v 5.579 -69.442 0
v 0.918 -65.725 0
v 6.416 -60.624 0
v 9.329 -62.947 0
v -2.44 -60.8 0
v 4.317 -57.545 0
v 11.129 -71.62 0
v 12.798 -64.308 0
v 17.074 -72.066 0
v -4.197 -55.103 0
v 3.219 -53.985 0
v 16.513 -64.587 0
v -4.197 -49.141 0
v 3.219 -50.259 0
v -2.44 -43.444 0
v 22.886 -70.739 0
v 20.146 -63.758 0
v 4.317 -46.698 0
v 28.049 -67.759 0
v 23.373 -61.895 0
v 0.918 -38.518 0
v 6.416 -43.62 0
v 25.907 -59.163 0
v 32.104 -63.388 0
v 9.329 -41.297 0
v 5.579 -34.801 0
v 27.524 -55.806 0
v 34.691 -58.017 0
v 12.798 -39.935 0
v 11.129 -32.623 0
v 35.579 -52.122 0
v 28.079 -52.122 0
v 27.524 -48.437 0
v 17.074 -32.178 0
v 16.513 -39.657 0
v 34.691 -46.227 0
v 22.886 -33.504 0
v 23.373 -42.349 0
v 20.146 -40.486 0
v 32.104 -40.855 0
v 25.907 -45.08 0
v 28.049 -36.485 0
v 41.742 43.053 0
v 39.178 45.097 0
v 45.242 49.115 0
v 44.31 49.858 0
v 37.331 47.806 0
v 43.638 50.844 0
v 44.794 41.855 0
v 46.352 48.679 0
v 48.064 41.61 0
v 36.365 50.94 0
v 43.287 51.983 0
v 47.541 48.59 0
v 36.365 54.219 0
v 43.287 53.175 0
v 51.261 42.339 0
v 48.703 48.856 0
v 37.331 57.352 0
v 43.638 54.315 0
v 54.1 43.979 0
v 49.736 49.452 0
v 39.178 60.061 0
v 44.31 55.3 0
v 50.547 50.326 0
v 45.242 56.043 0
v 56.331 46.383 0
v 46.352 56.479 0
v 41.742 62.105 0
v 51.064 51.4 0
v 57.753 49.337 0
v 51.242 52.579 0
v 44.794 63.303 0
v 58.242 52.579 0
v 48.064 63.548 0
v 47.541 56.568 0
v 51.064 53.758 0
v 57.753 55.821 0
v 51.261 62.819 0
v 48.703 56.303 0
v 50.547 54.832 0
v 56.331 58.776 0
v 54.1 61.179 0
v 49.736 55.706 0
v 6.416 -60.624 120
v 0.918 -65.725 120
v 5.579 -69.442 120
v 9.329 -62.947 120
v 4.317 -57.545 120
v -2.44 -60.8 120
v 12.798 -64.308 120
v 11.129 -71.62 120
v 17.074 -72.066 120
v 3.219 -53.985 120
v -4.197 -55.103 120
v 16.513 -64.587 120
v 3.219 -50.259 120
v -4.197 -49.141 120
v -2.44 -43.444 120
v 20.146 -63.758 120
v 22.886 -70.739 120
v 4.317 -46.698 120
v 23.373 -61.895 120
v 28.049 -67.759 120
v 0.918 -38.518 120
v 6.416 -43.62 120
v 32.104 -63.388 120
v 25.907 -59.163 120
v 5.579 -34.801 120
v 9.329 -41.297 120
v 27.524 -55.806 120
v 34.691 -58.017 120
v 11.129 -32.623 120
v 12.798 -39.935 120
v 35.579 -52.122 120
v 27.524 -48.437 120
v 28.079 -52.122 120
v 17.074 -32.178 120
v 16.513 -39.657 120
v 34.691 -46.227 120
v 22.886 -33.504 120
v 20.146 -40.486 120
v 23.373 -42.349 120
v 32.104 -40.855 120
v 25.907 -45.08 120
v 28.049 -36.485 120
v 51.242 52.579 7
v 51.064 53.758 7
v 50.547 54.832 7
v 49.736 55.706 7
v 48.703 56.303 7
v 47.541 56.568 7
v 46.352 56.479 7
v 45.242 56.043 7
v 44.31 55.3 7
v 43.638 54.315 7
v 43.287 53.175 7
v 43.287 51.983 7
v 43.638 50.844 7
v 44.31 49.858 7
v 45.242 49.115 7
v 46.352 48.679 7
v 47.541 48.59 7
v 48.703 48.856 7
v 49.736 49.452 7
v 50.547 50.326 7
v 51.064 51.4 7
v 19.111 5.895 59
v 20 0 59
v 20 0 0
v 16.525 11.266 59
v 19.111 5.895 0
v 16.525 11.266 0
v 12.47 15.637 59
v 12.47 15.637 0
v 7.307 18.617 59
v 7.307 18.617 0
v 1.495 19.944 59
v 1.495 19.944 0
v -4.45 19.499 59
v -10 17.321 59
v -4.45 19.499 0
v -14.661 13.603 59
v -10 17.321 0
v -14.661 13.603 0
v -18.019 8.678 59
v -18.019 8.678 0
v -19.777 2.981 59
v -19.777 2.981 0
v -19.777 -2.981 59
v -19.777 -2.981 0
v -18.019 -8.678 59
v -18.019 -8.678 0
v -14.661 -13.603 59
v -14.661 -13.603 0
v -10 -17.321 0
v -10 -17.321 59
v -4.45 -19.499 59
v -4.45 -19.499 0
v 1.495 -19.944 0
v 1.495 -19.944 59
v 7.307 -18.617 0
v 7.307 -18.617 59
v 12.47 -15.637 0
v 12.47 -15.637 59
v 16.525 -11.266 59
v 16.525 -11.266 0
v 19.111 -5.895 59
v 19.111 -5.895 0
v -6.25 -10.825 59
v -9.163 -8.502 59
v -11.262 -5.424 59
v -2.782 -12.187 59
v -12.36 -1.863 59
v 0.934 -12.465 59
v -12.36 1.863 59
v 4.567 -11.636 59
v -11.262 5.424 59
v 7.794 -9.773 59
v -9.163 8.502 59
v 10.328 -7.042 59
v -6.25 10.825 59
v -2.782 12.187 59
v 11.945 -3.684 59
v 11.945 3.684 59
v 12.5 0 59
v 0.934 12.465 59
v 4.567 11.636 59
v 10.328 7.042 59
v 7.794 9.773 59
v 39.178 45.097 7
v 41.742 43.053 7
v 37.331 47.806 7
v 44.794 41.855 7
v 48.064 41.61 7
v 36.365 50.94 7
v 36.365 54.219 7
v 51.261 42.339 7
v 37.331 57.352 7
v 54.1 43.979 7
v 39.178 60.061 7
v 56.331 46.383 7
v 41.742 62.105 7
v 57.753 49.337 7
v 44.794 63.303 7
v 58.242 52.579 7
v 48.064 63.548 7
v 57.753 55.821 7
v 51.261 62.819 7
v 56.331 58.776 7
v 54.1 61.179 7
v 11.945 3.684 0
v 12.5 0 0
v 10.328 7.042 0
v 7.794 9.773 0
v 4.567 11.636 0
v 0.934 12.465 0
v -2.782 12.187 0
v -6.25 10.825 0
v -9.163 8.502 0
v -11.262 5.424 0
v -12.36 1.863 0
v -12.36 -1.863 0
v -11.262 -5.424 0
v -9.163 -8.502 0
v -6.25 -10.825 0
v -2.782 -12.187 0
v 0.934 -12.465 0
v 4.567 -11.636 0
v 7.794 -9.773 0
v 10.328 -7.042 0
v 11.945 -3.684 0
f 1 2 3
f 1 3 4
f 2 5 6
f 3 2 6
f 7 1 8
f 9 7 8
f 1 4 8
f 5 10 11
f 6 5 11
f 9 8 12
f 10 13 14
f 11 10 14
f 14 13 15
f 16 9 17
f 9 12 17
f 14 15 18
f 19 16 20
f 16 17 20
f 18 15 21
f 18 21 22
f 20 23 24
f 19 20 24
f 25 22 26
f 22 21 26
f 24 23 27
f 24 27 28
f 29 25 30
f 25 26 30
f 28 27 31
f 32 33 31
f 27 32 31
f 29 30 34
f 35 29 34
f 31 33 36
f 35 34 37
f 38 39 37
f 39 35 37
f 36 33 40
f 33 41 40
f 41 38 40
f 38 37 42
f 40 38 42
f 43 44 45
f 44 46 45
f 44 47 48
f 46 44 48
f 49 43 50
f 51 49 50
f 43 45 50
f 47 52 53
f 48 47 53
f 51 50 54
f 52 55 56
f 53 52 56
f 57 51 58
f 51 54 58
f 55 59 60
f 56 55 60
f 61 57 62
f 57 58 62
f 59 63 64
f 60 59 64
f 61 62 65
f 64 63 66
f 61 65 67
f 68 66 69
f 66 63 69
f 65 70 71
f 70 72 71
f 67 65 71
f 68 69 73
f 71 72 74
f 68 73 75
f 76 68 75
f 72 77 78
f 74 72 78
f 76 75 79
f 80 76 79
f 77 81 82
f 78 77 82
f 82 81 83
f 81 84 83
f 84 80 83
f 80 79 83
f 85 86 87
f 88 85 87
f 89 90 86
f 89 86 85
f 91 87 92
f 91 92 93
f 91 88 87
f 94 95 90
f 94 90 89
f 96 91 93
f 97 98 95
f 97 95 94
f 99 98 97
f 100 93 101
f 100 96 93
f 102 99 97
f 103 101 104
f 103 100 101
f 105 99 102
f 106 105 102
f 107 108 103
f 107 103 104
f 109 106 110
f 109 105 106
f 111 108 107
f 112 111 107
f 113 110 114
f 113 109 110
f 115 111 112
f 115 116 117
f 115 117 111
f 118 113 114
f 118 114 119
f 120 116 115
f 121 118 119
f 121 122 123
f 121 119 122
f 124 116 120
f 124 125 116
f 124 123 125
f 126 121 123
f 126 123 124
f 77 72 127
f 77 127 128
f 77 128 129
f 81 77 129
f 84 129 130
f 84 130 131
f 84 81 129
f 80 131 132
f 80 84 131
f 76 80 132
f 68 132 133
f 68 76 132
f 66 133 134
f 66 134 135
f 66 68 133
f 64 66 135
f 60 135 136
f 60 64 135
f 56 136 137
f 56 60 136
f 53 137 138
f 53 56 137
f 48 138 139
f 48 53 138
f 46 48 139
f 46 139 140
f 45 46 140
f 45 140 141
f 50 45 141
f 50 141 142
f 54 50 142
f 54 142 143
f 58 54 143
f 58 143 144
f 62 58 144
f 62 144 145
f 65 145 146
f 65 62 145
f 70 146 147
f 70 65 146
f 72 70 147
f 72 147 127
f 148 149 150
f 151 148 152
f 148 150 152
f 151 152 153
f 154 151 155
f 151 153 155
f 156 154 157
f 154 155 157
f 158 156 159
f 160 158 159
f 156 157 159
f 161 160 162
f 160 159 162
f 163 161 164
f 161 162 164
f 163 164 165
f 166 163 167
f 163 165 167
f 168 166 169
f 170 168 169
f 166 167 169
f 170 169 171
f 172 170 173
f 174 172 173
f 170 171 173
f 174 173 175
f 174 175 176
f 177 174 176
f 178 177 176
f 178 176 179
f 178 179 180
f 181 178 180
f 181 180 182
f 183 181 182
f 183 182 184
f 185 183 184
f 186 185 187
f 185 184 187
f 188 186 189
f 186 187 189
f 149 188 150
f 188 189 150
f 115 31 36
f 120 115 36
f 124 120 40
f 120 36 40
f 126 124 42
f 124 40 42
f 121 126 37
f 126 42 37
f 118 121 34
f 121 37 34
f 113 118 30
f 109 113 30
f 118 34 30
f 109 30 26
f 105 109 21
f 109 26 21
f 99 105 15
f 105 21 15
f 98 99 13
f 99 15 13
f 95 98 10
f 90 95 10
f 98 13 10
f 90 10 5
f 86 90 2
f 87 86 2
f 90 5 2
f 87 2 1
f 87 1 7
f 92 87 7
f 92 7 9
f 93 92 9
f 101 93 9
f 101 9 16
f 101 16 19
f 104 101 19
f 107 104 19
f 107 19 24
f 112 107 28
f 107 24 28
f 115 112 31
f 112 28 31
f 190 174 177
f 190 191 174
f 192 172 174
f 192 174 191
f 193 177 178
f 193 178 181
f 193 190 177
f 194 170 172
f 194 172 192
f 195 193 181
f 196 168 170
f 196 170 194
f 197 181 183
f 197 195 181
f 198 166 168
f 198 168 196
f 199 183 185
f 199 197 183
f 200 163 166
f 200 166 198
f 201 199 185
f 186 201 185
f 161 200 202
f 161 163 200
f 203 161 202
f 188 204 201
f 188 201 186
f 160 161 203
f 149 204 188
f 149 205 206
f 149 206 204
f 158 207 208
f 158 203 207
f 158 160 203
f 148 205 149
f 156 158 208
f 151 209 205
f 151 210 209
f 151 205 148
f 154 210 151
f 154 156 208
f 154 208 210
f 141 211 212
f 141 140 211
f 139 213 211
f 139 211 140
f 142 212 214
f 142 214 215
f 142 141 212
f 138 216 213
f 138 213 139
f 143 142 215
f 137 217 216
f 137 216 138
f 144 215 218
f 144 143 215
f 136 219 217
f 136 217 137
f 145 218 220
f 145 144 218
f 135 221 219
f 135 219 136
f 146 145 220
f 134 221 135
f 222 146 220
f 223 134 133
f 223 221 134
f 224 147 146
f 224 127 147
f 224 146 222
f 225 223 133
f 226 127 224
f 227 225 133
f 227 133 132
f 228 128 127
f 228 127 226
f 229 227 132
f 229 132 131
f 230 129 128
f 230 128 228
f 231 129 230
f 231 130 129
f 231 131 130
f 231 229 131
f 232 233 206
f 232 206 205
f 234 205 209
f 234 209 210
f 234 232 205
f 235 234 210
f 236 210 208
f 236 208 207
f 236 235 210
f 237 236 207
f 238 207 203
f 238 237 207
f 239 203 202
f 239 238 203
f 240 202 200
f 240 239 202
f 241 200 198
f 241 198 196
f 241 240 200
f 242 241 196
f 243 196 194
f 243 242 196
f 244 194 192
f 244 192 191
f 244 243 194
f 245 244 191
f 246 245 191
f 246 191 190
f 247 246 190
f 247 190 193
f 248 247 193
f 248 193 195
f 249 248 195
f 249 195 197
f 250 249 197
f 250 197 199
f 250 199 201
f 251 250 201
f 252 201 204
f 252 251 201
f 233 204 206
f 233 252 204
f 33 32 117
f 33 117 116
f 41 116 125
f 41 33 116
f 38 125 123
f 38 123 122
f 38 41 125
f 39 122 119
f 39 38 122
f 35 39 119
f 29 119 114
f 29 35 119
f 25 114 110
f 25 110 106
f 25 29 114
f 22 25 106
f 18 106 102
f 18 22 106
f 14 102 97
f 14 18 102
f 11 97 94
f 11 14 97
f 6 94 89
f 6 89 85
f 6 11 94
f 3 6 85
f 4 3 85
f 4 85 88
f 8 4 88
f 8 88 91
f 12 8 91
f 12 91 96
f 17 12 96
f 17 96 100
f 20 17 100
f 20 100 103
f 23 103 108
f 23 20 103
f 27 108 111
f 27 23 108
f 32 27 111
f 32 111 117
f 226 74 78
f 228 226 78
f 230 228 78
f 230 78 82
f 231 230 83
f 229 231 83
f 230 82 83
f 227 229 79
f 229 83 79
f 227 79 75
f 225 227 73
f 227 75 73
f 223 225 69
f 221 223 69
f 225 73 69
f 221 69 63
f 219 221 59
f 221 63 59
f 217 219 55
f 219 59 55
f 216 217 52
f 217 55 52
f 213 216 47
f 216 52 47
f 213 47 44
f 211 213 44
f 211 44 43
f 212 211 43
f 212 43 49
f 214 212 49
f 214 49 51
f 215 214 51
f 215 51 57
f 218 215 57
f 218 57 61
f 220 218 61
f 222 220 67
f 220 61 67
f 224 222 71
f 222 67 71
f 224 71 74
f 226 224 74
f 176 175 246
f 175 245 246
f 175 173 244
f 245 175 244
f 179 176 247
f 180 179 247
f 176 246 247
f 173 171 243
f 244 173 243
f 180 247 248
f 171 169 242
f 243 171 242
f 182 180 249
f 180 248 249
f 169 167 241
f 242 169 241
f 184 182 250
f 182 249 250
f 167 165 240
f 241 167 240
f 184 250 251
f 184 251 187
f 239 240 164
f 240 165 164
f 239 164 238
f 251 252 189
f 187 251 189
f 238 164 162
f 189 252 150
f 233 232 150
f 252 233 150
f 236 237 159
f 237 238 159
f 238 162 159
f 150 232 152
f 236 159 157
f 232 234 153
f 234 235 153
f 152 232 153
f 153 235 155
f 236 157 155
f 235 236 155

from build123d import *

# Parameters (mm, degrees)
F0_R     = 20
F0_R_2   = 12.5
F1_DEPTH = 59
F2_R     = 11
F2_R_2   = 4
F3_DEPTH = 7
F4_DEPTH = 120


with BuildPart() as f1:
    # F0 (on Top) → F1 (new body)
    with BuildSketch(Plane.XY):
        Circle(F0_R)
        Circle(F0_R_2, mode=Mode.SUBTRACT)
    extrude(amount=F1_DEPTH)


with BuildPart() as f3:
    # F2 (on Top) → F3 (new body)
    with BuildSketch(Plane.XY):
        with Locations((47.24199, 52.579038)):
            Circle(F2_R)
        with Locations((47.24199, 52.579038)):
            Circle(F2_R_2, mode=Mode.SUBTRACT)
    extrude(amount=F3_DEPTH)


with BuildPart() as f4:
    # F0 (on Top) → F4 (new body)
    with BuildSketch(Plane.XY):
        with Locations((15.579269, -52.121885)):
            Circle(F0_R)
        with Locations((15.579269, -52.121885)):
            Circle(F0_R_2, mode=Mode.SUBTRACT)
    extrude(amount=F4_DEPTH)


solid = Compound([f1.part, f3.part, f4.part])
